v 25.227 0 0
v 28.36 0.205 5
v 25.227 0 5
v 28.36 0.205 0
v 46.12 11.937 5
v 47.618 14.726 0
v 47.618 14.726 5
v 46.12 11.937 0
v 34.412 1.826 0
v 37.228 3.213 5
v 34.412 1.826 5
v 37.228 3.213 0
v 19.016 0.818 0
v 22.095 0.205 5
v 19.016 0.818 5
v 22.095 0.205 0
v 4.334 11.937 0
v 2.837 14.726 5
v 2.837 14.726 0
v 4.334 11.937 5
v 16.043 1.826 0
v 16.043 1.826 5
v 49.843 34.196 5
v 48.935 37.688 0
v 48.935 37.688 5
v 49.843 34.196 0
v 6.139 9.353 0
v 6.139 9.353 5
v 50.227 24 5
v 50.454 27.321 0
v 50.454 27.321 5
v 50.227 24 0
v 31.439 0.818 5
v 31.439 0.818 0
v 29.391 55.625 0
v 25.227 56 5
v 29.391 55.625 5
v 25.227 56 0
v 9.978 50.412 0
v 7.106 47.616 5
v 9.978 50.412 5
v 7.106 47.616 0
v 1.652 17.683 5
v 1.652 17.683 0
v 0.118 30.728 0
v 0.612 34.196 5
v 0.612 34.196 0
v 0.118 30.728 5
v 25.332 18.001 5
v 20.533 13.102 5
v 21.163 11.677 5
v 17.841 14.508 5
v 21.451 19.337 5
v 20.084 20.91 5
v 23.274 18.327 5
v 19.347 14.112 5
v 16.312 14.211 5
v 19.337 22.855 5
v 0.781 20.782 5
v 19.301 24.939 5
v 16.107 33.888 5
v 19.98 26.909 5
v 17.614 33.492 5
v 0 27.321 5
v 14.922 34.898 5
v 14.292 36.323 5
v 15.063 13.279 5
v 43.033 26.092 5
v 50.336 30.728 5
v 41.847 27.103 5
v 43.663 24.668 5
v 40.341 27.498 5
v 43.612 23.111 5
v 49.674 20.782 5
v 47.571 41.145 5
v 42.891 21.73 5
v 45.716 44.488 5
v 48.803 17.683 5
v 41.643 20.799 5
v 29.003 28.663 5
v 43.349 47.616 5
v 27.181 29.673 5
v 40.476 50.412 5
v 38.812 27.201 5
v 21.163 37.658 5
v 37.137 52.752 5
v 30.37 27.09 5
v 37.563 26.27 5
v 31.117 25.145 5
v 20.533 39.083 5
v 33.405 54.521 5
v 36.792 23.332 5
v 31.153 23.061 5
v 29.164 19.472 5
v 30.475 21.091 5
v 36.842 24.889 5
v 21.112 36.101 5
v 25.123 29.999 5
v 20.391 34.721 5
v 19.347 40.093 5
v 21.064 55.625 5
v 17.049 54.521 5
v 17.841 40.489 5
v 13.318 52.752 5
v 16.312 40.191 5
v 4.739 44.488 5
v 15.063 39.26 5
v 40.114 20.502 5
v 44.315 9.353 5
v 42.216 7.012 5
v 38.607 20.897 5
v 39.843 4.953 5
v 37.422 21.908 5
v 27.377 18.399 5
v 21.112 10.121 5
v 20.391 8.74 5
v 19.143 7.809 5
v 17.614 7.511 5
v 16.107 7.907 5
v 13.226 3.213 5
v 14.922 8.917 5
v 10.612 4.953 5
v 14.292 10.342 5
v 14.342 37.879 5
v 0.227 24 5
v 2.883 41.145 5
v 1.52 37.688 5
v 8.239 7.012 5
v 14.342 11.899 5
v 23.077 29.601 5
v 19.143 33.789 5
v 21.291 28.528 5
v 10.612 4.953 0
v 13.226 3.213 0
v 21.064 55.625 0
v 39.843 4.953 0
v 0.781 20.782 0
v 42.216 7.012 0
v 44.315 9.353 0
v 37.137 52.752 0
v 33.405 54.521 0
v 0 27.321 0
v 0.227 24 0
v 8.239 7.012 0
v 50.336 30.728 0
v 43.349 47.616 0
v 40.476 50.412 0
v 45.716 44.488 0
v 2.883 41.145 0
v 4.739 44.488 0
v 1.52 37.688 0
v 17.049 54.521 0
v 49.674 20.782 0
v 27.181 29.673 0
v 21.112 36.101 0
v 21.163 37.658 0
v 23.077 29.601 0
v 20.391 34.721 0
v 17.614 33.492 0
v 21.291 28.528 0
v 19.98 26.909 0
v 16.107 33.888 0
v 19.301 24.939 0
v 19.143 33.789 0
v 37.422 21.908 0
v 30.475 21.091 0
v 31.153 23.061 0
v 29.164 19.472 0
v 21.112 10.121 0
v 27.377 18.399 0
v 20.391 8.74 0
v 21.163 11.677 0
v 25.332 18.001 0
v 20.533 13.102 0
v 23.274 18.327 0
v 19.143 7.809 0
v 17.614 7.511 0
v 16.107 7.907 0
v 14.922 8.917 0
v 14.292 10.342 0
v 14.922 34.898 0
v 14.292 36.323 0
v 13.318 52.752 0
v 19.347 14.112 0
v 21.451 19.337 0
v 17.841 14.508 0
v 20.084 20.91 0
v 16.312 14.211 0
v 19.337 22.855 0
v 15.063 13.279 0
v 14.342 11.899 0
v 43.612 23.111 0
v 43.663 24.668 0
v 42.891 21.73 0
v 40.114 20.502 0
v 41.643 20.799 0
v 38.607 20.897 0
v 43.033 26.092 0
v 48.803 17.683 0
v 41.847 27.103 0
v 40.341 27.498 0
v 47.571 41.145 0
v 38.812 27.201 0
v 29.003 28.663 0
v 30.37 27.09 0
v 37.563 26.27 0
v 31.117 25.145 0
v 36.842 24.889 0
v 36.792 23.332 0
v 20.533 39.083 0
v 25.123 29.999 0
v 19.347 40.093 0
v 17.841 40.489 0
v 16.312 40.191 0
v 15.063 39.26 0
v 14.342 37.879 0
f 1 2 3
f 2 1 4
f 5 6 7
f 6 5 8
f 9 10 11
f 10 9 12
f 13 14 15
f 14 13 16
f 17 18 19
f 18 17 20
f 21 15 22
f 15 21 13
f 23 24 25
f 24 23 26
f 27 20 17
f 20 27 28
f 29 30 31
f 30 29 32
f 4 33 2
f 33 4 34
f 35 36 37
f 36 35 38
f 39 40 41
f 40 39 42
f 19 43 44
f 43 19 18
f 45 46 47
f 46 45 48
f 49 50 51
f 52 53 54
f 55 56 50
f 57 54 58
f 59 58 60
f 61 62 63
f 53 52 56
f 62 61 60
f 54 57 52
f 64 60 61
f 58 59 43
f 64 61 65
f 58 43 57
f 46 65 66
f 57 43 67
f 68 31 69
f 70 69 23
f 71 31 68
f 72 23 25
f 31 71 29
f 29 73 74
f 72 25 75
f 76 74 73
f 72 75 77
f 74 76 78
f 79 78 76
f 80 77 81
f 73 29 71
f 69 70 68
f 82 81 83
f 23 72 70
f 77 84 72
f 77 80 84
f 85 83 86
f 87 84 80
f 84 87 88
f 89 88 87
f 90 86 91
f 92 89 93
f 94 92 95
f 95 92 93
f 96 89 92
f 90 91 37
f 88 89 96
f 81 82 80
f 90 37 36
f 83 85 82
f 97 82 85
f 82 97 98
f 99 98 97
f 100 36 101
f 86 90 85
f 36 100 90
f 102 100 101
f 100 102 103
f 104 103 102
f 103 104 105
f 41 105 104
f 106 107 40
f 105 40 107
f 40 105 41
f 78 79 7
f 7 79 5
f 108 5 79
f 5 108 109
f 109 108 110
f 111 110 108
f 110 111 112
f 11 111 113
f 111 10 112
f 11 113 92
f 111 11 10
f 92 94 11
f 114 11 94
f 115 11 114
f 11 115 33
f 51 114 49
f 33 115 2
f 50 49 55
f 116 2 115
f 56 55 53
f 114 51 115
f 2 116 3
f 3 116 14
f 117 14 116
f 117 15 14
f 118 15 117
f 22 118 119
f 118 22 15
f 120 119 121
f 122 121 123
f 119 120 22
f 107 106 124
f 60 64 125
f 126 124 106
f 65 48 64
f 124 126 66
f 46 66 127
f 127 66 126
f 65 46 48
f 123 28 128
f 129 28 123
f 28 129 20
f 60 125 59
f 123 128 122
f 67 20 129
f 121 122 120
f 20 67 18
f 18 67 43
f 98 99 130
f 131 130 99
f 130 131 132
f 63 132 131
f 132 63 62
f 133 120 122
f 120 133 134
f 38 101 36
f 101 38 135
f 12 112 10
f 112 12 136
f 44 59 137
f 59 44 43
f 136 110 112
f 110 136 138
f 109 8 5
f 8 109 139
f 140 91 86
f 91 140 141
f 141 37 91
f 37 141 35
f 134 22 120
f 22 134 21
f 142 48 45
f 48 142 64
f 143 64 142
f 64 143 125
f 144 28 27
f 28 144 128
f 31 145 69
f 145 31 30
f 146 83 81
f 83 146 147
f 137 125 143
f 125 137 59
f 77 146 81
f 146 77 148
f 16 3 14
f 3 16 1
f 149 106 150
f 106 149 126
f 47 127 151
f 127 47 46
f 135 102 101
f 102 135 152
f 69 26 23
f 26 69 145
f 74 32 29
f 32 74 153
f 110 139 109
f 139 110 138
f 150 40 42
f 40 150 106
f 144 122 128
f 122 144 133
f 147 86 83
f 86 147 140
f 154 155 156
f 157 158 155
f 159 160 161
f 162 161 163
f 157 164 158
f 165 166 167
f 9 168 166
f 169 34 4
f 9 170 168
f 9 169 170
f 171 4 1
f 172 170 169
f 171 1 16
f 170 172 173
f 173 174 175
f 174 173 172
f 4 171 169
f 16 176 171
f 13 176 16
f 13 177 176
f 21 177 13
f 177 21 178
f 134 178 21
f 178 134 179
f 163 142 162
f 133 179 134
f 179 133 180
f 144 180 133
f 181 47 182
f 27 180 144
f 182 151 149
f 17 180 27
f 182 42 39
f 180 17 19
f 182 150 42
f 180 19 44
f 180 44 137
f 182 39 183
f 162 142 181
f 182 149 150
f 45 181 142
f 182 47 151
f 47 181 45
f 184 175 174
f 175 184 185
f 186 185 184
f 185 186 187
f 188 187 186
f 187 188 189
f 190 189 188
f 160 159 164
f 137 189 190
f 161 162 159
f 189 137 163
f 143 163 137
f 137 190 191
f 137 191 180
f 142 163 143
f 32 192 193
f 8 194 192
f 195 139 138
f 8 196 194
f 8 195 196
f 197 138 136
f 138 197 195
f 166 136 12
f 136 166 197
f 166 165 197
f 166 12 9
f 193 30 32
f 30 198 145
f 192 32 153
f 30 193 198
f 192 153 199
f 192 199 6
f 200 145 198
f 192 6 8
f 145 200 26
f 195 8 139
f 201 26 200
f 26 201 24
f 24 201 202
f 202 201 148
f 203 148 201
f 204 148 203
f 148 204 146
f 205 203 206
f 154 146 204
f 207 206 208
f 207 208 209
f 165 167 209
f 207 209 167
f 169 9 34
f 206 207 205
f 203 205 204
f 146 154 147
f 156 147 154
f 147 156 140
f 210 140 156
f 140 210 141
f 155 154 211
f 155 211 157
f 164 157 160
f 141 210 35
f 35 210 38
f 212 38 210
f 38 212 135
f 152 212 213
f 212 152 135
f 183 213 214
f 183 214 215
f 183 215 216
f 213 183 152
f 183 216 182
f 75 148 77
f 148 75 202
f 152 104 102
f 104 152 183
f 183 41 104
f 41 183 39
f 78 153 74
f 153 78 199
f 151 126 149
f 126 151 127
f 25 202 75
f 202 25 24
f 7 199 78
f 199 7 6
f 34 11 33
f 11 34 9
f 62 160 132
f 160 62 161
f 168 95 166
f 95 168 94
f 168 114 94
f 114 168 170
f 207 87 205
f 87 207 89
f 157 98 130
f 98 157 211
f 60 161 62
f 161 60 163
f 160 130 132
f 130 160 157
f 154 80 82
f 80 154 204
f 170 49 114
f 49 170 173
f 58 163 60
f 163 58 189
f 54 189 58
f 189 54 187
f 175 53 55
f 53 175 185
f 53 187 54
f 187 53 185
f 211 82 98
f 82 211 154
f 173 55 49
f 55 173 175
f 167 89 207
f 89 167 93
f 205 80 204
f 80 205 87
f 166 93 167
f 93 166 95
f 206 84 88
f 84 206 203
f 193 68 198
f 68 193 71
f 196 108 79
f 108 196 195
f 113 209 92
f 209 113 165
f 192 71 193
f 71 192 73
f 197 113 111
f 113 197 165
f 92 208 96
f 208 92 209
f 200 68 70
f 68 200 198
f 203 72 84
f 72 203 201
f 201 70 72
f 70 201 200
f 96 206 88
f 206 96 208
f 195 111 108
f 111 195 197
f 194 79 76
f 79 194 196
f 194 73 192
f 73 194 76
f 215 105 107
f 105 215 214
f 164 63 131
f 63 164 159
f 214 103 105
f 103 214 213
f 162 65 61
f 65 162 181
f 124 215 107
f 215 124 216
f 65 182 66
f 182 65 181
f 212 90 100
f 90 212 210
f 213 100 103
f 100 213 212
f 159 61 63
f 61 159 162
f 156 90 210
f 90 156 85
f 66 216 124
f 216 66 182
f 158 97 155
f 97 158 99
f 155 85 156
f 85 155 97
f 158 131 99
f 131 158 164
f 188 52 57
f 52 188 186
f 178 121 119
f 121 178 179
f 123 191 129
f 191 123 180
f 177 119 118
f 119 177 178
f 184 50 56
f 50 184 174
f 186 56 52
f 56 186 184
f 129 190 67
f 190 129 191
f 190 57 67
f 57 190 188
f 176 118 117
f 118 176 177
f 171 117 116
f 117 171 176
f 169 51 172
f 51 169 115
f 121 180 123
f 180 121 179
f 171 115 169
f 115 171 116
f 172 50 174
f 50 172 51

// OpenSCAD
$fn = 32;

// ----------------------------------------------------------------------
// Cam plate: single_lobe cam, base R24
// ----------------------------------------------------------------------

// --- parameters (mm) ---
base_r = 24;              // base circle radius
lobe_h = 8;               // cam lobe rise
bore_r = 6;               // shaft bore radius
plate_t = 5;              // plate thickness, Z (extrusion height)
ring_r = 15;              // lightening ring radius
bolt_r = 3.5;             // lightening hole radius

profile = [[50.227, 24], [50.454, 27.321], [50.336, 30.728], [49.843, 34.196], [48.935, 37.688], [47.571, 41.145], [45.716, 44.488], [43.349, 47.616], [40.476, 50.412], [37.137, 52.752], [33.405, 54.521], [29.391, 55.625], [25.227, 56], [21.064, 55.625], [17.049, 54.521], [13.318, 52.752], [9.978, 50.412], [7.106, 47.616], [4.739, 44.488], [2.883, 41.145], [1.52, 37.688], [0.612, 34.196], [0.118, 30.728], [0, 27.321], [0.227, 24], [0.781, 20.782], [1.652, 17.683], [2.837, 14.726], [4.334, 11.937], [6.139, 9.353], [8.239, 7.012], [10.612, 4.953], [13.226, 3.213], [16.043, 1.826], [19.016, 0.818], [22.095, 0.205], [25.227, 0], [28.36, 0.205], [31.439, 0.818], [34.412, 1.826], [37.228, 3.213], [39.843, 4.953], [42.216, 7.012], [44.315, 9.353], [46.12, 11.937], [47.618, 14.726], [48.803, 17.683], [49.674, 20.782]];  // primary outline, 48 points, counter clockwise
void_1 = [[31.117, 25.145], [30.37, 27.09], [29.003, 28.663], [27.181, 29.673], [25.123, 29.999], [23.077, 29.601], [21.291, 28.528], [19.98, 26.909], [19.301, 24.939], [19.337, 22.855], [20.084, 20.91], [21.451, 19.337], [23.274, 18.327], [25.332, 18.001], [27.377, 18.399], [29.164, 19.472], [30.475, 21.091], [31.153, 23.061]];  // shaft bore, 18 points
void_2 = [[43.663, 24.668], [43.033, 26.092], [41.847, 27.103], [40.341, 27.498], [38.812, 27.201], [37.563, 26.27], [36.842, 24.889], [36.792, 23.332], [37.422, 21.908], [38.607, 20.897], [40.114, 20.502], [41.643, 20.799], [42.891, 21.73], [43.612, 23.111]];  // lightening hole 1, 14 points
void_3 = [[21.163, 37.658], [20.533, 39.083], [19.347, 40.093], [17.841, 40.489], [16.312, 40.191], [15.063, 39.26], [14.342, 37.879], [14.292, 36.323], [14.922, 34.898], [16.107, 33.888], [17.614, 33.492], [19.143, 33.789], [20.391, 34.721], [21.112, 36.101]];  // lightening hole 2, 14 points
void_4 = [[21.163, 11.677], [20.533, 13.102], [19.347, 14.112], [17.841, 14.508], [16.312, 14.211], [15.063, 13.279], [14.342, 11.899], [14.292, 10.342], [14.922, 8.917], [16.107, 7.907], [17.614, 7.511], [19.143, 7.809], [20.391, 8.74], [21.112, 10.121]];  // lightening hole 3, 14 points

// --- the one profile operation ---
difference() {
  linear_extrude(height = plate_t) polygon(points = profile);
  translate([0, 0, -1])
    linear_extrude(height = plate_t + 2) polygon(points = void_1);
  translate([0, 0, -1])
    linear_extrude(height = plate_t + 2) polygon(points = void_2);
  translate([0, 0, -1])
    linear_extrude(height = plate_t + 2) polygon(points = void_3);
  translate([0, 0, -1])
    linear_extrude(height = plate_t + 2) polygon(points = void_4);
}
